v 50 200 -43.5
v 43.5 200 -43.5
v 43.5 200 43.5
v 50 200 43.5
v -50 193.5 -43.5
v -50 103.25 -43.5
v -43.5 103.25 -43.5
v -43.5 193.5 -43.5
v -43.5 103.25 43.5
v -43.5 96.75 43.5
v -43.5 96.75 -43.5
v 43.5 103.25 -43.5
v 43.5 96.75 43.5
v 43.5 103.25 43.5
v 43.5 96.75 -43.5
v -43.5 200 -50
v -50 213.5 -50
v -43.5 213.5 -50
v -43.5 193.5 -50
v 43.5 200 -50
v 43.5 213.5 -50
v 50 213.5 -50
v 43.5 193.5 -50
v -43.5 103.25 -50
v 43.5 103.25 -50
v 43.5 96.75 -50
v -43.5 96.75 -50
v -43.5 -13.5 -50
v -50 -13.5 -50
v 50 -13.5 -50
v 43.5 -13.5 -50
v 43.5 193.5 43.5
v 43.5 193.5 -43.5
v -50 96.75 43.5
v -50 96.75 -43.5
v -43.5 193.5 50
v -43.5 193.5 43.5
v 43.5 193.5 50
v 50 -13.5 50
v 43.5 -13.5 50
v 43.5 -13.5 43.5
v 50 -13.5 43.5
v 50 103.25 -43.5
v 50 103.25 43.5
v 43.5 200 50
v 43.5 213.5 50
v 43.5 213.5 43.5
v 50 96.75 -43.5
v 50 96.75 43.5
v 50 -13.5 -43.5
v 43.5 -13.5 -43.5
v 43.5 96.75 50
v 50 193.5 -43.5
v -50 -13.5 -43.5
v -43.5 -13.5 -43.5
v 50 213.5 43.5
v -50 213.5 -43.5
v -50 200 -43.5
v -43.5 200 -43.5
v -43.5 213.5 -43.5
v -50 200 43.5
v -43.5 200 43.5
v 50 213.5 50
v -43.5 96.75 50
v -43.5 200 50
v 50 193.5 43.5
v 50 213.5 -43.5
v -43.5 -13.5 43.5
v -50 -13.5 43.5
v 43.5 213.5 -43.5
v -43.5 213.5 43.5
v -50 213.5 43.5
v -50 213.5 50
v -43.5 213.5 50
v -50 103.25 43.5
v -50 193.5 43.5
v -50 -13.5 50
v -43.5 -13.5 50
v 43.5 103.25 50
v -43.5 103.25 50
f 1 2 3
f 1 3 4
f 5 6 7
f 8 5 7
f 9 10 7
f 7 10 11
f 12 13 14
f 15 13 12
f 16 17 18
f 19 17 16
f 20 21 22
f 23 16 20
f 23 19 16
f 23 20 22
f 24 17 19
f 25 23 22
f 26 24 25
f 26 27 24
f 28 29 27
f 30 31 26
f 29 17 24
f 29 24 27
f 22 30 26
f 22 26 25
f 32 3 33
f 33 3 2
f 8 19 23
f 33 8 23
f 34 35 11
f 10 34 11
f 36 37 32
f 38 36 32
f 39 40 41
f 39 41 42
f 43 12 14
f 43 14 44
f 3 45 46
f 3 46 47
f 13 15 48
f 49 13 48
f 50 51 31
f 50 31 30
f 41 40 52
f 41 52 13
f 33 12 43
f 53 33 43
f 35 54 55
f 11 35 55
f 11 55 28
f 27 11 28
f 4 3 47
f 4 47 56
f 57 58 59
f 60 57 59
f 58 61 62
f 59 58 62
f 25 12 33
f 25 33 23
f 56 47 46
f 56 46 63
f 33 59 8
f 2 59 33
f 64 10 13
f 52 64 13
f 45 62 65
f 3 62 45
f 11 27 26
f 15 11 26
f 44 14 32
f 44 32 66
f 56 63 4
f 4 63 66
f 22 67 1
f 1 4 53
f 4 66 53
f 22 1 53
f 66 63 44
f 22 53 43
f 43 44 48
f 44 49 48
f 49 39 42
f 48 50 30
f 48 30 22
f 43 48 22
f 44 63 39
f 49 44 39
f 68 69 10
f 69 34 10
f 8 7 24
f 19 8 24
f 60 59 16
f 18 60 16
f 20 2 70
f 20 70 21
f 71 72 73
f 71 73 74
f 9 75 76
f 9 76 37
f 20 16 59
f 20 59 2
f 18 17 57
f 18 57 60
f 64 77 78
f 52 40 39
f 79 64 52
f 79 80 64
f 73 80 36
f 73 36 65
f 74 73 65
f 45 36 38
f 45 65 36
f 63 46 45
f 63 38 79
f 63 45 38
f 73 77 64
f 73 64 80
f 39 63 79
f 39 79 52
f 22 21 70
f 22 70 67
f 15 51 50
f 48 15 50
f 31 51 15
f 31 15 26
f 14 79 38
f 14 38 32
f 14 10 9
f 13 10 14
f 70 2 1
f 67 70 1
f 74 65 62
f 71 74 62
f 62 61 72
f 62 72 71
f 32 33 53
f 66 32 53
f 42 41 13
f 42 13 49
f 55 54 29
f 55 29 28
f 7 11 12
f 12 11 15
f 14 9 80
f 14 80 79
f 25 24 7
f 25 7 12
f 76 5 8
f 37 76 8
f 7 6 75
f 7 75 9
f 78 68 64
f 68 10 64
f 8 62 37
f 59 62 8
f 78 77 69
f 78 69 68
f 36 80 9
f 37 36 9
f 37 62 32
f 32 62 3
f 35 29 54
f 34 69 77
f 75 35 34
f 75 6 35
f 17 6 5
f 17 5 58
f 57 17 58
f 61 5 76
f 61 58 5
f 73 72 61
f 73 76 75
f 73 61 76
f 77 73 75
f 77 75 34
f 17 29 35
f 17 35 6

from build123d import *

# Parameters (mm, degrees)
SKETCH3_W                = 6.5
SKETCH3_H                = 6.5
BOSS_EXTRUDE1_DEPTH      = 200
BOSS_EXTRUDE1_2_DEPTH    = 200
BOSS_EXTRUDE1_3_DEPTH    = 200
BOSS_EXTRUDE1_4_DEPTH    = 200
SKETCH11_W               = 100
SKETCH11_H               = 100
SKETCH11_W_2             = 87
SKETCH11_H_2             = 87
BOSS_EXTRUDE7_DEPTH      = 6.5
BOSS_EXTRUDE8_DEPTH      = 3.25
BOSS_EXTRUDE8_DEPTH_BACK = 3.25
BOSS_EXTRUDE8_START      = -100
SKETCH12_W               = 100
SKETCH12_H               = 100
SKETCH12_W_2             = 87
SKETCH12_H_2             = 87
SKETCH13_W               = 6.5
SKETCH13_H               = 6.5
BOSS_EXTRUDE9_DEPTH      = 13.5
SKETCH14_W               = 6.5
SKETCH14_H               = 6.5
BOSS_EXTRUDE10_DEPTH     = 13.5


with BuildPart() as part:
    # Sketch3 → Boss-Extrude1 (new body)
    with BuildSketch(Plane(origin=(0, 0, 0), x_dir=(1, 0, 0), z_dir=(0, 1, 0))):
        with Locations((-46.75, 46.75)):
            Rectangle(SKETCH3_W, SKETCH3_H)
    extrude(amount=BOSS_EXTRUDE1_DEPTH)



with BuildPart() as body_2:
    # Sketch3 → Boss-Extrude1 2 (new body)
    with BuildSketch(Plane(origin=(0, 0, 0), x_dir=(1, 0, 0), z_dir=(0, 1, 0))):
        with Locations((46.75, 46.75)):
            Rectangle(SKETCH3_W, SKETCH3_H)
    extrude(amount=BOSS_EXTRUDE1_2_DEPTH)


with BuildPart() as body_3:
    # Sketch3 → Boss-Extrude1 3 (new body)
    with BuildSketch(Plane(origin=(0, 0, 0), x_dir=(1, 0, 0), z_dir=(0, 1, 0))):
        with Locations((46.75, -46.75)):
            Rectangle(SKETCH3_W, SKETCH3_H)
    extrude(amount=BOSS_EXTRUDE1_3_DEPTH)


with BuildPart() as body_4:
    # Sketch3 → Boss-Extrude1 4 (new body)
    with BuildSketch(Plane(origin=(0, 0, 0), x_dir=(1, 0, 0), z_dir=(0, 1, 0))):
        with Locations((-46.75, -46.75)):
            Rectangle(SKETCH3_W, SKETCH3_H)
    extrude(amount=BOSS_EXTRUDE1_4_DEPTH)


with BuildPart() as part_1:
    add(part.part)

    add(body_2.part)  # Boss-Extrude7 merges body 2

    add(body_3.part)  # Boss-Extrude7 merges body 3

    add(body_4.part)  # Boss-Extrude7 merges body 4
    # Sketch11 → Boss-Extrude7 (add)
    with BuildSketch(Plane(origin=(0, 200, 0), x_dir=(1, 0, 0), z_dir=(0, 1, 0))):
        Rectangle(SKETCH11_W, SKETCH11_H)
        Rectangle(SKETCH11_W_2, SKETCH11_H_2, mode=Mode.SUBTRACT)
    extrude(amount=-BOSS_EXTRUDE7_DEPTH)

    # Sketch12 → Boss-Extrude8 (add, two sides: drawn at the far end of the back side and taken through both)
    with BuildSketch(Plane(origin=(0, 200, 0), x_dir=(1, 0, 0), z_dir=(0, 1, 0)).offset(BOSS_EXTRUDE8_START - BOSS_EXTRUDE8_DEPTH_BACK)):
        Rectangle(SKETCH12_W, SKETCH12_H)
        Rectangle(SKETCH12_W_2, SKETCH12_H_2, mode=Mode.SUBTRACT)
    extrude(amount=BOSS_EXTRUDE8_DEPTH + BOSS_EXTRUDE8_DEPTH_BACK)

    # Sketch13 → Boss-Extrude9 (add)
    with BuildSketch(Plane(origin=(0, 200, 0), x_dir=(1, 0, 0), z_dir=(0, 1, 0))):
        with Locations((-46.75, 46.75)):
            Rectangle(SKETCH13_W, SKETCH13_H)
        with Locations((46.75, 46.75)):
            Rectangle(SKETCH13_W, SKETCH13_H)
        with Locations((46.75, -46.75)):
            Rectangle(SKETCH13_W, SKETCH13_H)
        with Locations((-46.75, -46.75)):
            Rectangle(SKETCH13_W, SKETCH13_H)
    extrude(amount=BOSS_EXTRUDE9_DEPTH)

    # Sketch14 → Boss-Extrude10 (add)
    with BuildSketch(Plane.XZ):
        with Locations((-46.75, 46.75)):
            Rectangle(SKETCH14_W, SKETCH14_H)
        with Locations((46.75, 46.75)):
            Rectangle(SKETCH14_W, SKETCH14_H)
        with Locations((46.75, -46.75)):
            Rectangle(SKETCH14_W, SKETCH14_H)
        with Locations((-46.75, -46.75)):
            Rectangle(SKETCH14_W, SKETCH14_H)
    extrude(amount=BOSS_EXTRUDE10_DEPTH)


solid = part_1.part
